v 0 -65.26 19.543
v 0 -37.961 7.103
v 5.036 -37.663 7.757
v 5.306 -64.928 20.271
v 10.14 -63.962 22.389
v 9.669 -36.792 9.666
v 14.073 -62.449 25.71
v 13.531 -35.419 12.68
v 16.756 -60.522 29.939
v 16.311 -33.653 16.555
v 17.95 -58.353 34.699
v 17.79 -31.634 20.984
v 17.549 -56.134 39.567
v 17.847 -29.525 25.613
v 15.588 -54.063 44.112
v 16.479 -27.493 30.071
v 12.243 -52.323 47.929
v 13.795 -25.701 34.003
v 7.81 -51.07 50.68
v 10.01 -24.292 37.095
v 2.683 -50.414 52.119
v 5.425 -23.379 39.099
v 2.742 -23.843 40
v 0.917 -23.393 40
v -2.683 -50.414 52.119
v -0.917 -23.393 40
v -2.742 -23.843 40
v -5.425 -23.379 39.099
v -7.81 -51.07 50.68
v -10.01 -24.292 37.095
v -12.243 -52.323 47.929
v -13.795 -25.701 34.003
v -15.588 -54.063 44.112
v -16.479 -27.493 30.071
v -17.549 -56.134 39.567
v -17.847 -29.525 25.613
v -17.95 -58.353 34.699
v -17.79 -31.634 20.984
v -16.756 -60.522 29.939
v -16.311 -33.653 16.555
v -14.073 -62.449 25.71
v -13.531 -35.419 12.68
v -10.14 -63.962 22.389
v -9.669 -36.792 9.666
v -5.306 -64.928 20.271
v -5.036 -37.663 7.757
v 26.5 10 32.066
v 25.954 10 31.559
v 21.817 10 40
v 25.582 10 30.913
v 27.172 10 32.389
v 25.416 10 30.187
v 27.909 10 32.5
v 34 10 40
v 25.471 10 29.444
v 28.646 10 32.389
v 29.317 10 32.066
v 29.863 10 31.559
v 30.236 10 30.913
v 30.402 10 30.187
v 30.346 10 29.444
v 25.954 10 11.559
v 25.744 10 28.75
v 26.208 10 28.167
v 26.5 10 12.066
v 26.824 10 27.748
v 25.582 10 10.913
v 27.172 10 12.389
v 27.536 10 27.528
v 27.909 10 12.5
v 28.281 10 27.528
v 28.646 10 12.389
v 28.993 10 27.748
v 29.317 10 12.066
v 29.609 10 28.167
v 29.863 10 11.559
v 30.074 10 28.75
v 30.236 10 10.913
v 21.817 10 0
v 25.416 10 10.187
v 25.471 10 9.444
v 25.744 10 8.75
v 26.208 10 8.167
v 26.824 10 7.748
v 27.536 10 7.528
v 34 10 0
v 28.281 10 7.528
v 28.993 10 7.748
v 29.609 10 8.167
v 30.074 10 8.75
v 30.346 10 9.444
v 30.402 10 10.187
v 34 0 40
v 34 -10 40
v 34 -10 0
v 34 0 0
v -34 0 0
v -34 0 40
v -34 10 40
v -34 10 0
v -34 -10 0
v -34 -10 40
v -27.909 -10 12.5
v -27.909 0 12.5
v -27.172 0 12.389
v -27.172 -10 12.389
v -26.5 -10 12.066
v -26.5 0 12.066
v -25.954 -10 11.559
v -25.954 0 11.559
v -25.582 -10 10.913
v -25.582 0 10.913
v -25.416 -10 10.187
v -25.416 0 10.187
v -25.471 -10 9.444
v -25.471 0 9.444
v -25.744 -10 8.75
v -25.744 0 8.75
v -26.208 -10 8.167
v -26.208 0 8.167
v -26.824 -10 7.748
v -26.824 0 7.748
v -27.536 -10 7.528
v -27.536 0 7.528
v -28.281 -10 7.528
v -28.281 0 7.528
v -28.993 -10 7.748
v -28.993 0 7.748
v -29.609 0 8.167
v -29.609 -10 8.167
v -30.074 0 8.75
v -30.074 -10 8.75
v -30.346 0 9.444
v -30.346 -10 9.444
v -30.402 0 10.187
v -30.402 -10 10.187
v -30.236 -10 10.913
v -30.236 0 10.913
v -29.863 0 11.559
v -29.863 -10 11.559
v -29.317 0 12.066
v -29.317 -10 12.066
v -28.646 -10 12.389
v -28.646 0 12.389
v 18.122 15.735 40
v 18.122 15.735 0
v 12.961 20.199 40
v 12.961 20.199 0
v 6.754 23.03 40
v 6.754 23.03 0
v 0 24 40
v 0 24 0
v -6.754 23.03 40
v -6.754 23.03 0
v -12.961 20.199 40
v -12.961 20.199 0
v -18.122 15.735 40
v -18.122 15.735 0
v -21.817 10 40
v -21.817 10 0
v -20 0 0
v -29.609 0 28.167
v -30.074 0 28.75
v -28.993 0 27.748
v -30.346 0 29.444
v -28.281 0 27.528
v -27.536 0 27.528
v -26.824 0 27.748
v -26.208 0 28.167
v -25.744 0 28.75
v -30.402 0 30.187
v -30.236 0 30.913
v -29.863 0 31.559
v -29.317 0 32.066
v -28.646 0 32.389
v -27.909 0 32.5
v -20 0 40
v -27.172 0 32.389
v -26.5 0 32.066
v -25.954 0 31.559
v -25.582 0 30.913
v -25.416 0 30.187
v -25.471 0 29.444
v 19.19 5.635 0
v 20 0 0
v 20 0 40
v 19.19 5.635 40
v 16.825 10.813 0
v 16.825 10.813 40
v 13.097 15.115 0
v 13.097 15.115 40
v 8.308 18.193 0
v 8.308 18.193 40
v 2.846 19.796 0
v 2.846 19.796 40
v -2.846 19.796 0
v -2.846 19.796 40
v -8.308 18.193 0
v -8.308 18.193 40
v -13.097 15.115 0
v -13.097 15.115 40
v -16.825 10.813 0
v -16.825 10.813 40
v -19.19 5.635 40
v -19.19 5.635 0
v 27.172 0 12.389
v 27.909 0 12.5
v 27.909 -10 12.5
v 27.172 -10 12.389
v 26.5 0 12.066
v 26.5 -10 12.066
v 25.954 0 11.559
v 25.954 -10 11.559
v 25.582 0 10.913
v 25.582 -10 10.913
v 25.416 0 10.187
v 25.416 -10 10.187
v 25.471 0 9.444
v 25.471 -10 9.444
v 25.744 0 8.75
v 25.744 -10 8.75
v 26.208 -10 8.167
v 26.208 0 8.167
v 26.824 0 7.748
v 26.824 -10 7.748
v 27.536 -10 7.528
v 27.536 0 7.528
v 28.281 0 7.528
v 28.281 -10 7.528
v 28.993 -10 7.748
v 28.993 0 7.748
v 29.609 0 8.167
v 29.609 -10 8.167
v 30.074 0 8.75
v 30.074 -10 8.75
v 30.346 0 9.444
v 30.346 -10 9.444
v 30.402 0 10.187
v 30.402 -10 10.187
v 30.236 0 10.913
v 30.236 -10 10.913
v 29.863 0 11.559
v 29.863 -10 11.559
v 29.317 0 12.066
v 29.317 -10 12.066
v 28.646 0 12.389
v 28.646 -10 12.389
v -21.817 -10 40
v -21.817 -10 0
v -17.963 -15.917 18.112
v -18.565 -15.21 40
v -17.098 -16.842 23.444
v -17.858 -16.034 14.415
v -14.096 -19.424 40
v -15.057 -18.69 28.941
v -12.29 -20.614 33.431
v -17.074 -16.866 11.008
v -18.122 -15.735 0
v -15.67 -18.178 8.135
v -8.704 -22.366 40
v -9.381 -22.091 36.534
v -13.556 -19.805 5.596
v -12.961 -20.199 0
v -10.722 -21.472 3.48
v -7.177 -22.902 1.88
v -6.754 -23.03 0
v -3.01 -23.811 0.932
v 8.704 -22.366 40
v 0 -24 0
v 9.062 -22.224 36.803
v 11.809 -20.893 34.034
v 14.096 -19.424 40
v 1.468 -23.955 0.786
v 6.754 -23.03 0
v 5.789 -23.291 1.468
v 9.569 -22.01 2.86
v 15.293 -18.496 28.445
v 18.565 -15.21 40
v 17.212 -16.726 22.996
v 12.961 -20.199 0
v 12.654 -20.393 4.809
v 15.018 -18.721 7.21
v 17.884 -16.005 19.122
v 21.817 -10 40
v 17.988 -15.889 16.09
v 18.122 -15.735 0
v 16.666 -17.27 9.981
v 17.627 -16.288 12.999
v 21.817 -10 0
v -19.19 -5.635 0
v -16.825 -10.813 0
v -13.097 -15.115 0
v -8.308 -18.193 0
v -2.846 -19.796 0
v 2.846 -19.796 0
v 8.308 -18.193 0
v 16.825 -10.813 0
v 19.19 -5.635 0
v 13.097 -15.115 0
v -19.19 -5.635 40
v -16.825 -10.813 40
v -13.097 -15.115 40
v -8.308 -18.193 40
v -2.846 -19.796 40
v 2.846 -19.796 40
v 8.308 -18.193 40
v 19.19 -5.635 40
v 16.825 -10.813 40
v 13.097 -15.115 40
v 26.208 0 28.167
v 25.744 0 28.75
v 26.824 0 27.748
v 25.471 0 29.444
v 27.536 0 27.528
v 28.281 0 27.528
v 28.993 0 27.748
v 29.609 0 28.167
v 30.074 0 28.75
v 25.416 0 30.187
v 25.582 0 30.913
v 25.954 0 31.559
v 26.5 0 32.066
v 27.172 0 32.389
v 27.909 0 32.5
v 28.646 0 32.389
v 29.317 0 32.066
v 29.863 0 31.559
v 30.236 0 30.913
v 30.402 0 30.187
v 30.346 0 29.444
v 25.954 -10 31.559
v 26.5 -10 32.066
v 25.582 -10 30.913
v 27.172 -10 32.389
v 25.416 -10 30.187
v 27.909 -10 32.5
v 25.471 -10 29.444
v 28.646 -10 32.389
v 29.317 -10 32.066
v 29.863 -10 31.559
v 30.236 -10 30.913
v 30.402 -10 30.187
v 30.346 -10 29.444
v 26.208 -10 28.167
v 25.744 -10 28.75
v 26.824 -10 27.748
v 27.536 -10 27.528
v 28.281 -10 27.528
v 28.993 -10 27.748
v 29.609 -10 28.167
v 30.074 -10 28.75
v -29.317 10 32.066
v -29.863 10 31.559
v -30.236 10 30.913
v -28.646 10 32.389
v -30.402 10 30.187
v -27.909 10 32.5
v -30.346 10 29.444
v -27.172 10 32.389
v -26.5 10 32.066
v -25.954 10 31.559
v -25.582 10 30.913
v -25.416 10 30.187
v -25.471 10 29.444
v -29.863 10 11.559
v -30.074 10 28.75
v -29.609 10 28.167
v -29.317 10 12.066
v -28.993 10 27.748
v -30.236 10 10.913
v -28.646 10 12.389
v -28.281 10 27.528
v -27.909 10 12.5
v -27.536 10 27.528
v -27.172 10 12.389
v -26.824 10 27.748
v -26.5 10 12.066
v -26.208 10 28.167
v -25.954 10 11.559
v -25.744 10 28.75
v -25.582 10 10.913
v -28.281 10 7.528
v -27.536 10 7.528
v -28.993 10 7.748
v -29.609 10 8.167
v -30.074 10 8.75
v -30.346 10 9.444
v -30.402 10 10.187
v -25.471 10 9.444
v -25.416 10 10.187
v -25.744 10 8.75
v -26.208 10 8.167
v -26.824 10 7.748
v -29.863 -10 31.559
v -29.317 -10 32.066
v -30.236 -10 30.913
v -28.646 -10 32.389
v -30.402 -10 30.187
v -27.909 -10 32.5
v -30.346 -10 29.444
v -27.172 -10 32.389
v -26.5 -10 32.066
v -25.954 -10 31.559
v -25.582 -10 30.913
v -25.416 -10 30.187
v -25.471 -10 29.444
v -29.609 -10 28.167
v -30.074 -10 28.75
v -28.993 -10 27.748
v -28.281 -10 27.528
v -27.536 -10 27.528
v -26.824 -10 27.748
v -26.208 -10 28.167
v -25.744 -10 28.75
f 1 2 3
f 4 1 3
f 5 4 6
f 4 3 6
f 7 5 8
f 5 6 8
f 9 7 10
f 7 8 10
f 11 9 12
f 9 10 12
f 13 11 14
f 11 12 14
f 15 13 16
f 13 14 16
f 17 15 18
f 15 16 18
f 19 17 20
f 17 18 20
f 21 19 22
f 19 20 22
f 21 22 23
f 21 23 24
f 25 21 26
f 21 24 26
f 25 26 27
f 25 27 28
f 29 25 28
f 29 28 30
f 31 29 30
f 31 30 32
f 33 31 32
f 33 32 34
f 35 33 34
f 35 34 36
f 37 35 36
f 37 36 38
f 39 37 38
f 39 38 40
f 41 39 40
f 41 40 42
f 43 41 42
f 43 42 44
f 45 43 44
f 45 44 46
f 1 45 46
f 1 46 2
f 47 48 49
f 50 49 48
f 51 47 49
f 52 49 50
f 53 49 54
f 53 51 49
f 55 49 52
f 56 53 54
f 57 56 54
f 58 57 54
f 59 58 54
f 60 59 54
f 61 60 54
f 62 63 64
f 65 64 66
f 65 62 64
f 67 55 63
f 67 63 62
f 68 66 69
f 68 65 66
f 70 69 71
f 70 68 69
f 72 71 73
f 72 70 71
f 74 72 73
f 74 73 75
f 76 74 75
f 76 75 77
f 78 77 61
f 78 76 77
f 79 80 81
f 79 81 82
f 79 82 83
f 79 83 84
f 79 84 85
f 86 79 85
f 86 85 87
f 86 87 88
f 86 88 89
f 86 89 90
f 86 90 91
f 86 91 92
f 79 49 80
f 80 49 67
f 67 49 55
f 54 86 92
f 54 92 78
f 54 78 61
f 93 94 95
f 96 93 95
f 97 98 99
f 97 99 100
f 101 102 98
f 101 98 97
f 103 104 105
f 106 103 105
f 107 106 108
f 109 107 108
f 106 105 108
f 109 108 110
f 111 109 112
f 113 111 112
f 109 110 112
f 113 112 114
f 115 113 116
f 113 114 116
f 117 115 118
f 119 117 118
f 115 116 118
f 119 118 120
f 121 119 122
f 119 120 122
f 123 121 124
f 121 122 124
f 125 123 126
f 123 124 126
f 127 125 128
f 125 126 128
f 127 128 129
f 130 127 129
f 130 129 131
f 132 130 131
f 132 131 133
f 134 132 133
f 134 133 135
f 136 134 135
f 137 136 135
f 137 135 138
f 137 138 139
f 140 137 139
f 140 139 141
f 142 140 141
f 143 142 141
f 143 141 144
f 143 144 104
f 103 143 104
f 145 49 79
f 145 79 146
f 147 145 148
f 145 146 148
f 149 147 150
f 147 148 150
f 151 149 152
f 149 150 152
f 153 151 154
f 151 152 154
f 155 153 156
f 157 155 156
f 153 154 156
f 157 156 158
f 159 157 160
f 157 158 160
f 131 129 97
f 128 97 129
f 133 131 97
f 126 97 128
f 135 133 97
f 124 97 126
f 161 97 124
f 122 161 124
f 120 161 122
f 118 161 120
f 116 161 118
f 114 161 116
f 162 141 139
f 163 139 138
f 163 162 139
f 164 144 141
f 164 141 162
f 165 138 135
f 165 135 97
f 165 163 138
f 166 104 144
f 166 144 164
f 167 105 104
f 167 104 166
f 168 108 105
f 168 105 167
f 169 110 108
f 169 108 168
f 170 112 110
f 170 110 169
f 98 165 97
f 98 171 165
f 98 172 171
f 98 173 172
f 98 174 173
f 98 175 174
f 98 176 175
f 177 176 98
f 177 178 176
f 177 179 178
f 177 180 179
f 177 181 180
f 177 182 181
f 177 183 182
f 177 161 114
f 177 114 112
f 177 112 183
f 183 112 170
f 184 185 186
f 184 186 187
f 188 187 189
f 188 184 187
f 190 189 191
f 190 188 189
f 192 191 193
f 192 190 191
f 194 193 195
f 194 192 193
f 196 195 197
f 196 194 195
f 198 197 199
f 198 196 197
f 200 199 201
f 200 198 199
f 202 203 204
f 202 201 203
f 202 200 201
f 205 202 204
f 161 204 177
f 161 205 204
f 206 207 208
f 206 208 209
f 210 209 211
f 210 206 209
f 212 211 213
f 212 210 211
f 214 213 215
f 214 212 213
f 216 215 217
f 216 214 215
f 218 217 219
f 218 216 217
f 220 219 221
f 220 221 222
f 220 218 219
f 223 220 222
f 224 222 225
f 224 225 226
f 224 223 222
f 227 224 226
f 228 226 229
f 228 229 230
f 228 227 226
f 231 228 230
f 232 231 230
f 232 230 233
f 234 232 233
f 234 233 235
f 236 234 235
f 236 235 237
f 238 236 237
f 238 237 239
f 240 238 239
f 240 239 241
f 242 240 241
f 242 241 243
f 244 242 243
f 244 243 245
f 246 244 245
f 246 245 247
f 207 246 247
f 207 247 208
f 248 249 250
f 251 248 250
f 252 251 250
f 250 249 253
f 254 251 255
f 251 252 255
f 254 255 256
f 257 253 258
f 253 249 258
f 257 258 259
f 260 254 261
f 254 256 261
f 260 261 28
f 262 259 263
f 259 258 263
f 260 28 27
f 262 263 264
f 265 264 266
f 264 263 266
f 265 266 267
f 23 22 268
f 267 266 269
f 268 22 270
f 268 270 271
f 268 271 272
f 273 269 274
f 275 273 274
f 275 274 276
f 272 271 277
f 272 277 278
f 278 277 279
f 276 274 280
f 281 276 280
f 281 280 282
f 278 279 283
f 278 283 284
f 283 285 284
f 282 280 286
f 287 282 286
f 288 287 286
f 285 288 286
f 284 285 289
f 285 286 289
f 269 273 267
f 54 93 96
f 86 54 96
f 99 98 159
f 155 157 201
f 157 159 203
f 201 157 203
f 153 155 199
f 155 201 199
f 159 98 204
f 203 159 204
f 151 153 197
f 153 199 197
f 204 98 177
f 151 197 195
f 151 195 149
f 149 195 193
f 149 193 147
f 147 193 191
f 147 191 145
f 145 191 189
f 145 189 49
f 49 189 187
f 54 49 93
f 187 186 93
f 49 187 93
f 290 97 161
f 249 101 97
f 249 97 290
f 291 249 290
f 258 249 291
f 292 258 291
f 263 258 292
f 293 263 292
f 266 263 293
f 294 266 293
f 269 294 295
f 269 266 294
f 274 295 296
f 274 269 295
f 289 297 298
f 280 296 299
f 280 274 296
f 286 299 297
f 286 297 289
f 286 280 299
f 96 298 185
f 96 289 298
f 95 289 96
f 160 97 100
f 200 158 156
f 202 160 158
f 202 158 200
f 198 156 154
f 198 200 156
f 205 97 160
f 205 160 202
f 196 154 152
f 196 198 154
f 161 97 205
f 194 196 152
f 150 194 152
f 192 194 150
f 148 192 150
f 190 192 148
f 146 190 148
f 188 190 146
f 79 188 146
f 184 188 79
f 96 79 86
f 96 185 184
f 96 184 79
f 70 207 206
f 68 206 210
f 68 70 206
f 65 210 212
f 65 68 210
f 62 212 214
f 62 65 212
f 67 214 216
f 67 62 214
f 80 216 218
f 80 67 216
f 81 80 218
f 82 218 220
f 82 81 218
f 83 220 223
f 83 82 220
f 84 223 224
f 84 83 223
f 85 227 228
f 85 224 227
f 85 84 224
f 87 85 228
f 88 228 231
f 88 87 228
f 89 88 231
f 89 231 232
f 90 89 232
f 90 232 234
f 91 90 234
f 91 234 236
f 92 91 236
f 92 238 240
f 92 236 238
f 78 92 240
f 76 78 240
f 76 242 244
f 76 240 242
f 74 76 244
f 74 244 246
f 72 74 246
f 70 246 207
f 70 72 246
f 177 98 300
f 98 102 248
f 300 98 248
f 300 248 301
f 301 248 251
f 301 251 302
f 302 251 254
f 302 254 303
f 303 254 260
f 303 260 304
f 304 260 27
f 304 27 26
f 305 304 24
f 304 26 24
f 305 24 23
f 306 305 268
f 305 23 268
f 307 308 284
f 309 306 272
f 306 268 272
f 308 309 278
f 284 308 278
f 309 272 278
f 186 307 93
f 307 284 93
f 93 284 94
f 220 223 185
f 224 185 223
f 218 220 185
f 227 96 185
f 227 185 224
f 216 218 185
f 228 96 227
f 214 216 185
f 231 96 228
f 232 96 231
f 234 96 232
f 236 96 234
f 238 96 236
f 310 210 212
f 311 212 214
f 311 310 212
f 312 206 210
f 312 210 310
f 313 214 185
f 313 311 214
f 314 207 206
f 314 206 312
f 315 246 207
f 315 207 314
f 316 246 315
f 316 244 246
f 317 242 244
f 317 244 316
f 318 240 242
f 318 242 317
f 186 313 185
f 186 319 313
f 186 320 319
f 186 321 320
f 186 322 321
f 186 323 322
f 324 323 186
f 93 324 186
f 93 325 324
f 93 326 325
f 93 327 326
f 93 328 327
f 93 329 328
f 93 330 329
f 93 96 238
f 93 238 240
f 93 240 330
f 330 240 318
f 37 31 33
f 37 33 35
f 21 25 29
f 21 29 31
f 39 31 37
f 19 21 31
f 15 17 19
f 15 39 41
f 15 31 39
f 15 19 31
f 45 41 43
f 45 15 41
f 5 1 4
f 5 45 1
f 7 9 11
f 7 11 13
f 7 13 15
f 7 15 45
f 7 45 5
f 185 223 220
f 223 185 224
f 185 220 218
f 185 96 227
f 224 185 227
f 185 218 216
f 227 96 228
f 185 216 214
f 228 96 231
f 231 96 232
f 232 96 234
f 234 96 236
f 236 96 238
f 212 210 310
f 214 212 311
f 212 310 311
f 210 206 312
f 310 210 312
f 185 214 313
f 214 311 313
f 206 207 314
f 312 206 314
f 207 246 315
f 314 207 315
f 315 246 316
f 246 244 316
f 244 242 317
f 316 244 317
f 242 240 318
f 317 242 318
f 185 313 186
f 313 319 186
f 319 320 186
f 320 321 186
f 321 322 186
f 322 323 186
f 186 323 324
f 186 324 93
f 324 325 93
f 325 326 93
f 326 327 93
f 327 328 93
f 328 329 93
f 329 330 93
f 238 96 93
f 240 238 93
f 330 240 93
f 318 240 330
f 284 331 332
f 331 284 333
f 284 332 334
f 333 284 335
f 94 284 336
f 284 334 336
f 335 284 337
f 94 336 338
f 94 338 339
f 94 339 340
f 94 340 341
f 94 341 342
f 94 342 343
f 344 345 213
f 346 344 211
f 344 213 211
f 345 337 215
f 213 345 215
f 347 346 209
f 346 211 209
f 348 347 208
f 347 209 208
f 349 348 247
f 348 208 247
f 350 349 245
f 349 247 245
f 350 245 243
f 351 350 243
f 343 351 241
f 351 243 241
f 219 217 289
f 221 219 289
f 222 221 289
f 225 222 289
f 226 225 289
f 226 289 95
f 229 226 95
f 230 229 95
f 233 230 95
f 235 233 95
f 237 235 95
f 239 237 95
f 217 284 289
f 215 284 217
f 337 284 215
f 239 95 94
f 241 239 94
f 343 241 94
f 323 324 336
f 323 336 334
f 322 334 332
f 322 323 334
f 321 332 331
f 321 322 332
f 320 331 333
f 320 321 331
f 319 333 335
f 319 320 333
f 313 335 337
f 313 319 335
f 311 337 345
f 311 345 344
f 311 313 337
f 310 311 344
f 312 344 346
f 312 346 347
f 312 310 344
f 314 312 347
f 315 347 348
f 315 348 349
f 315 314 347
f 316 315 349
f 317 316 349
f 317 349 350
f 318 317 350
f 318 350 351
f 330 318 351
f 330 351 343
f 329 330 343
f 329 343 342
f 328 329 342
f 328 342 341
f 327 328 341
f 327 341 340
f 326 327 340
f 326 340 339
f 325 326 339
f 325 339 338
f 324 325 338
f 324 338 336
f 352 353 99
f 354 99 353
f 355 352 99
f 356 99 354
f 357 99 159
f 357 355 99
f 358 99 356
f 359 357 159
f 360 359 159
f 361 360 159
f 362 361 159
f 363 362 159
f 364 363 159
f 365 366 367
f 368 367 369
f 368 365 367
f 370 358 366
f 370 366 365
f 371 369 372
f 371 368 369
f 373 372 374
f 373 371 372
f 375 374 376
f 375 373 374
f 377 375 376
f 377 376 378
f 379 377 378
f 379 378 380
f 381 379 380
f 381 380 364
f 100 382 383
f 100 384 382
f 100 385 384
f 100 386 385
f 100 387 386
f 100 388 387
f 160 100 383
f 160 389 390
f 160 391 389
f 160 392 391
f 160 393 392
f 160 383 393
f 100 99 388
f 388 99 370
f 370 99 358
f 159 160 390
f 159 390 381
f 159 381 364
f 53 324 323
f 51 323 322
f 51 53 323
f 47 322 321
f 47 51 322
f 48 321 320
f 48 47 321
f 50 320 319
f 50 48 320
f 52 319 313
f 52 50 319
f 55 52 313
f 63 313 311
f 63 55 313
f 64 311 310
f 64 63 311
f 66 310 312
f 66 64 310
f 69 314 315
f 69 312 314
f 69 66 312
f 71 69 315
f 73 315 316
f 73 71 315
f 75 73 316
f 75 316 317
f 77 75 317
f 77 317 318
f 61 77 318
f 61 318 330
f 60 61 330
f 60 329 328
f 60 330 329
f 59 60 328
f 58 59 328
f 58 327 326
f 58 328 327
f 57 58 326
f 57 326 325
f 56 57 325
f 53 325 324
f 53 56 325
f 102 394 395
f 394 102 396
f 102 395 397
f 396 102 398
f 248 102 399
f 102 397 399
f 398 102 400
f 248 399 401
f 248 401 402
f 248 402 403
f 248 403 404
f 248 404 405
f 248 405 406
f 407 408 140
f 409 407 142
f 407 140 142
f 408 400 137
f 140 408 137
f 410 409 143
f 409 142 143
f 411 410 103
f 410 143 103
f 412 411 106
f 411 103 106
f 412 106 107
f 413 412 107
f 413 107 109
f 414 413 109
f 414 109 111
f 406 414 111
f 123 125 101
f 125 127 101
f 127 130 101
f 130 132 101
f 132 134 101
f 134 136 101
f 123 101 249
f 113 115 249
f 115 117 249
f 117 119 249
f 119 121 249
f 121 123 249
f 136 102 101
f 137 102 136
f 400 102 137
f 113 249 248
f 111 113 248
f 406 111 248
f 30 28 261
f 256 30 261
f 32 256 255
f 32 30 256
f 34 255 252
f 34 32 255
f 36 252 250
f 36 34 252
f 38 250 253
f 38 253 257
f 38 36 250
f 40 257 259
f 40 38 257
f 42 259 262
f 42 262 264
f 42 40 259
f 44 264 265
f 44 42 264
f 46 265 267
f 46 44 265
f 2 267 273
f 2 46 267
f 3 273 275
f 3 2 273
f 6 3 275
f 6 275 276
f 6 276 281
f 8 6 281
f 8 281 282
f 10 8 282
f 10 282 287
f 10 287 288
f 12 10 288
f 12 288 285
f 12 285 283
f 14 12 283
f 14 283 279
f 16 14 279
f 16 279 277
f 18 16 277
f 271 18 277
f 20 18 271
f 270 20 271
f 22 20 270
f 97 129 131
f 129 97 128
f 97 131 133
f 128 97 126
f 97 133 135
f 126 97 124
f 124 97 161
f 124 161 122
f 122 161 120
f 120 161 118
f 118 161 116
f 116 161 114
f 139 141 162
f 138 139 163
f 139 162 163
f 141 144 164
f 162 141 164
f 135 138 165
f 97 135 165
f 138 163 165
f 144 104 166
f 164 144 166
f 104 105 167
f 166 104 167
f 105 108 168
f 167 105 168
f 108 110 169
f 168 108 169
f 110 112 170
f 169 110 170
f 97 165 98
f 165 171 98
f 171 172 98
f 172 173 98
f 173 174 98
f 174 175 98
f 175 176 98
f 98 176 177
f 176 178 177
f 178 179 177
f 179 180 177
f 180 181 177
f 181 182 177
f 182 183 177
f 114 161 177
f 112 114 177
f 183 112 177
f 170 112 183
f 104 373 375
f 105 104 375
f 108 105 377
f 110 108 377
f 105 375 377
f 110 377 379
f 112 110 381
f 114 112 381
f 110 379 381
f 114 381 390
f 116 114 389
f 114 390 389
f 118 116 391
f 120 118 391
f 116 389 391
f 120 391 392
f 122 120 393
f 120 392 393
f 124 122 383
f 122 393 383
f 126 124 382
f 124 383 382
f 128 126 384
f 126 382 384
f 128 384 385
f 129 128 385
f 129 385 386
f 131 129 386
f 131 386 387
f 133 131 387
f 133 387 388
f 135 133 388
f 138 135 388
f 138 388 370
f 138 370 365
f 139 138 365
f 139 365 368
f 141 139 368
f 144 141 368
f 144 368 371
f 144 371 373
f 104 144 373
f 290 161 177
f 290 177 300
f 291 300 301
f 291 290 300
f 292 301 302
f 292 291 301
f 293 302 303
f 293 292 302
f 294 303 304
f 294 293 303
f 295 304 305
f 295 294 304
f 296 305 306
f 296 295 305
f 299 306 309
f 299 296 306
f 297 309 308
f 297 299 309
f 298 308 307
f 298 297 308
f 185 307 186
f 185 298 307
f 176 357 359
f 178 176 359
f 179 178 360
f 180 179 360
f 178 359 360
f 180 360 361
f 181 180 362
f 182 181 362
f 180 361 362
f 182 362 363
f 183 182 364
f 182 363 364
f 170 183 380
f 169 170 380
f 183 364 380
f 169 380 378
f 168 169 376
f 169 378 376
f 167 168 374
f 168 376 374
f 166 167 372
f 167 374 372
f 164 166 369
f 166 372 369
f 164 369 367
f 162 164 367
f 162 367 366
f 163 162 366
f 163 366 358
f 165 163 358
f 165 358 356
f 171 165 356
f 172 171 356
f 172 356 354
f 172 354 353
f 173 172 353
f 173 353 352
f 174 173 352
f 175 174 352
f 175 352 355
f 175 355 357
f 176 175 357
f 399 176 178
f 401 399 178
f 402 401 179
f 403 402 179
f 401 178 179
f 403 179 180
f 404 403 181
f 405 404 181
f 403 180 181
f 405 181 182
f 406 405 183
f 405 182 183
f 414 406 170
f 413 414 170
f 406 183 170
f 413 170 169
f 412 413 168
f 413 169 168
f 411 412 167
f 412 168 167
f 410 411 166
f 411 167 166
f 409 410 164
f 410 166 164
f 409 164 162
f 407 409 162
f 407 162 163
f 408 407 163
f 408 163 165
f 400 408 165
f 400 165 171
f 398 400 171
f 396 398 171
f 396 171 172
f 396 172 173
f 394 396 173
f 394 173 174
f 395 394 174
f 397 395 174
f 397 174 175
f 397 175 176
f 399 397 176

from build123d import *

# Parameters (mm, degrees)
SKETCH1_R                       = 24
SKETCH1_R_2                     = 20
BOSS_EXTRUDE1_DEPTH             = 40
BOSS_EXTRUDE2_DEPTH             = 10
BOSS_EXTRUDE2_DEPTH_BACK        = 10
SKETCH2_W                       = 14
SKETCH2_H                       = 40
CUT_EXTRUDE1_REACH              = 64.546
SKETCH5_R                       = 2.5
SKETCH6_R                       = 18
BOSS_EXTRUDE4_DEPTH             = 30
BOSS_EXTRUDE4_DIRECTION_2_REACH = 73.632


with BuildPart() as part:
    # Sketch1 → Boss-Extrude1 (new body)
    with BuildSketch(Plane.XY):
        Circle(SKETCH1_R)
        Circle(SKETCH1_R_2, mode=Mode.SUBTRACT)
    extrude(amount=BOSS_EXTRUDE1_DEPTH)

    # Sketch2 → Boss-Extrude2 (add, two sides: drawn at the far end of the back side and taken through both)
    with BuildSketch(Plane(origin=(0, 0, 0), x_dir=(1, 0, 0), z_dir=(0, 1, 0)).offset(-BOSS_EXTRUDE2_DEPTH_BACK)):
        with Locations((-27, -20)):
            Rectangle(SKETCH2_W, SKETCH2_H)
        with Locations((27, -20)):
            Rectangle(SKETCH2_W, SKETCH2_H)
    extrude(amount=BOSS_EXTRUDE2_DEPTH + BOSS_EXTRUDE2_DEPTH_BACK)

    # Sketch5 → Cut-Extrude1 (cut, up to next)
    with BuildSketch(Plane(origin=(0, 10, 0), x_dir=(1, 0, 0), z_dir=(0, 1, 0)), mode=Mode.PRIVATE) as cut_extrude1_sk1:
        with Locations((-27.908712115, -10)):
            Circle(SKETCH5_R)
    cut_extrude1_tool1 = extrude(cut_extrude1_sk1.sketch, amount=-CUT_EXTRUDE1_REACH, mode=Mode.PRIVATE) & part.part
    # Sketch5 → Cut-Extrude1 (cut, up to next)
    with BuildSketch(Plane(origin=(0, 10, 0), x_dir=(1, 0, 0), z_dir=(0, 1, 0)), mode=Mode.PRIVATE) as cut_extrude1_sk2:
        with Locations((-27.908712115, -30)):
            Circle(SKETCH5_R)
    cut_extrude1_tool2 = extrude(cut_extrude1_sk2.sketch, amount=-CUT_EXTRUDE1_REACH, mode=Mode.PRIVATE) & part.part
    cut_extrude1_1 = cut_extrude1_tool1.solids().sort_by_distance((-27.908712, 10, 10))[0]
    add(cut_extrude1_1, mode=Mode.SUBTRACT)
    cut_extrude1_2 = cut_extrude1_tool2.solids().sort_by_distance((-27.908712, 10, 30))[0]
    add(cut_extrude1_2, mode=Mode.SUBTRACT)
    cut_extrude1 = cut_extrude1_1 + cut_extrude1_2  # Cut-Extrude1 as one shape, for the pattern or mirror that repeats it

    # Mirror1: Cut-Extrude1 across plane
    add(cut_extrude1.mirror(Plane(origin=(0, 0, 0), x_dir=(0, 0, 1), z_dir=(1, 0, 0))), mode=Mode.SUBTRACT)


with BuildPart() as body_2:
    # Split1: the piece on the far side of the plane
    add(part.part)
    split(bisect_by=Plane.ZX, keep=Keep.BOTTOM)

    # Sketch6 → Boss-Extrude4 (add)
    with BuildSketch(Plane(origin=(0, -34.112734586, 15.546068799), x_dir=(1, 0, 0), z_dir=(0, -0.9099612708765458, 0.41469324265623353))):
        with Locations((0, 8.720962066)):
            Circle(SKETCH6_R)
    extrude(amount=BOSS_EXTRUDE4_DEPTH)

    # Sketch6 → Boss-Extrude4 direction 2 (add, up to next)
    with BuildSketch(Plane(origin=(0, -34.112734586, 15.546068799), x_dir=(1, 0, 0), z_dir=(0, -0.9099612708765458, 0.41469324265623353)), mode=Mode.PRIVATE) as boss_extrude4_direction_2_sk1:
        with Locations((0, 8.720962066)):
            Circle(SKETCH6_R)
    boss_extrude4_direction_2_tool1 = extrude(boss_extrude4_direction_2_sk1.sketch, amount=-BOSS_EXTRUDE4_DIRECTION_2_REACH, mode=Mode.PRIVATE) - body_2.part
    add(boss_extrude4_direction_2_tool1.solids().sort_by_distance((0, -30.496211, 23.481807))[0])


with BuildPart() as part_1:
    add(part.part)

    # Split1
    split(bisect_by=Plane.ZX, keep=Keep.TOP)


solid = Compound([body_2.part, part_1.part])
